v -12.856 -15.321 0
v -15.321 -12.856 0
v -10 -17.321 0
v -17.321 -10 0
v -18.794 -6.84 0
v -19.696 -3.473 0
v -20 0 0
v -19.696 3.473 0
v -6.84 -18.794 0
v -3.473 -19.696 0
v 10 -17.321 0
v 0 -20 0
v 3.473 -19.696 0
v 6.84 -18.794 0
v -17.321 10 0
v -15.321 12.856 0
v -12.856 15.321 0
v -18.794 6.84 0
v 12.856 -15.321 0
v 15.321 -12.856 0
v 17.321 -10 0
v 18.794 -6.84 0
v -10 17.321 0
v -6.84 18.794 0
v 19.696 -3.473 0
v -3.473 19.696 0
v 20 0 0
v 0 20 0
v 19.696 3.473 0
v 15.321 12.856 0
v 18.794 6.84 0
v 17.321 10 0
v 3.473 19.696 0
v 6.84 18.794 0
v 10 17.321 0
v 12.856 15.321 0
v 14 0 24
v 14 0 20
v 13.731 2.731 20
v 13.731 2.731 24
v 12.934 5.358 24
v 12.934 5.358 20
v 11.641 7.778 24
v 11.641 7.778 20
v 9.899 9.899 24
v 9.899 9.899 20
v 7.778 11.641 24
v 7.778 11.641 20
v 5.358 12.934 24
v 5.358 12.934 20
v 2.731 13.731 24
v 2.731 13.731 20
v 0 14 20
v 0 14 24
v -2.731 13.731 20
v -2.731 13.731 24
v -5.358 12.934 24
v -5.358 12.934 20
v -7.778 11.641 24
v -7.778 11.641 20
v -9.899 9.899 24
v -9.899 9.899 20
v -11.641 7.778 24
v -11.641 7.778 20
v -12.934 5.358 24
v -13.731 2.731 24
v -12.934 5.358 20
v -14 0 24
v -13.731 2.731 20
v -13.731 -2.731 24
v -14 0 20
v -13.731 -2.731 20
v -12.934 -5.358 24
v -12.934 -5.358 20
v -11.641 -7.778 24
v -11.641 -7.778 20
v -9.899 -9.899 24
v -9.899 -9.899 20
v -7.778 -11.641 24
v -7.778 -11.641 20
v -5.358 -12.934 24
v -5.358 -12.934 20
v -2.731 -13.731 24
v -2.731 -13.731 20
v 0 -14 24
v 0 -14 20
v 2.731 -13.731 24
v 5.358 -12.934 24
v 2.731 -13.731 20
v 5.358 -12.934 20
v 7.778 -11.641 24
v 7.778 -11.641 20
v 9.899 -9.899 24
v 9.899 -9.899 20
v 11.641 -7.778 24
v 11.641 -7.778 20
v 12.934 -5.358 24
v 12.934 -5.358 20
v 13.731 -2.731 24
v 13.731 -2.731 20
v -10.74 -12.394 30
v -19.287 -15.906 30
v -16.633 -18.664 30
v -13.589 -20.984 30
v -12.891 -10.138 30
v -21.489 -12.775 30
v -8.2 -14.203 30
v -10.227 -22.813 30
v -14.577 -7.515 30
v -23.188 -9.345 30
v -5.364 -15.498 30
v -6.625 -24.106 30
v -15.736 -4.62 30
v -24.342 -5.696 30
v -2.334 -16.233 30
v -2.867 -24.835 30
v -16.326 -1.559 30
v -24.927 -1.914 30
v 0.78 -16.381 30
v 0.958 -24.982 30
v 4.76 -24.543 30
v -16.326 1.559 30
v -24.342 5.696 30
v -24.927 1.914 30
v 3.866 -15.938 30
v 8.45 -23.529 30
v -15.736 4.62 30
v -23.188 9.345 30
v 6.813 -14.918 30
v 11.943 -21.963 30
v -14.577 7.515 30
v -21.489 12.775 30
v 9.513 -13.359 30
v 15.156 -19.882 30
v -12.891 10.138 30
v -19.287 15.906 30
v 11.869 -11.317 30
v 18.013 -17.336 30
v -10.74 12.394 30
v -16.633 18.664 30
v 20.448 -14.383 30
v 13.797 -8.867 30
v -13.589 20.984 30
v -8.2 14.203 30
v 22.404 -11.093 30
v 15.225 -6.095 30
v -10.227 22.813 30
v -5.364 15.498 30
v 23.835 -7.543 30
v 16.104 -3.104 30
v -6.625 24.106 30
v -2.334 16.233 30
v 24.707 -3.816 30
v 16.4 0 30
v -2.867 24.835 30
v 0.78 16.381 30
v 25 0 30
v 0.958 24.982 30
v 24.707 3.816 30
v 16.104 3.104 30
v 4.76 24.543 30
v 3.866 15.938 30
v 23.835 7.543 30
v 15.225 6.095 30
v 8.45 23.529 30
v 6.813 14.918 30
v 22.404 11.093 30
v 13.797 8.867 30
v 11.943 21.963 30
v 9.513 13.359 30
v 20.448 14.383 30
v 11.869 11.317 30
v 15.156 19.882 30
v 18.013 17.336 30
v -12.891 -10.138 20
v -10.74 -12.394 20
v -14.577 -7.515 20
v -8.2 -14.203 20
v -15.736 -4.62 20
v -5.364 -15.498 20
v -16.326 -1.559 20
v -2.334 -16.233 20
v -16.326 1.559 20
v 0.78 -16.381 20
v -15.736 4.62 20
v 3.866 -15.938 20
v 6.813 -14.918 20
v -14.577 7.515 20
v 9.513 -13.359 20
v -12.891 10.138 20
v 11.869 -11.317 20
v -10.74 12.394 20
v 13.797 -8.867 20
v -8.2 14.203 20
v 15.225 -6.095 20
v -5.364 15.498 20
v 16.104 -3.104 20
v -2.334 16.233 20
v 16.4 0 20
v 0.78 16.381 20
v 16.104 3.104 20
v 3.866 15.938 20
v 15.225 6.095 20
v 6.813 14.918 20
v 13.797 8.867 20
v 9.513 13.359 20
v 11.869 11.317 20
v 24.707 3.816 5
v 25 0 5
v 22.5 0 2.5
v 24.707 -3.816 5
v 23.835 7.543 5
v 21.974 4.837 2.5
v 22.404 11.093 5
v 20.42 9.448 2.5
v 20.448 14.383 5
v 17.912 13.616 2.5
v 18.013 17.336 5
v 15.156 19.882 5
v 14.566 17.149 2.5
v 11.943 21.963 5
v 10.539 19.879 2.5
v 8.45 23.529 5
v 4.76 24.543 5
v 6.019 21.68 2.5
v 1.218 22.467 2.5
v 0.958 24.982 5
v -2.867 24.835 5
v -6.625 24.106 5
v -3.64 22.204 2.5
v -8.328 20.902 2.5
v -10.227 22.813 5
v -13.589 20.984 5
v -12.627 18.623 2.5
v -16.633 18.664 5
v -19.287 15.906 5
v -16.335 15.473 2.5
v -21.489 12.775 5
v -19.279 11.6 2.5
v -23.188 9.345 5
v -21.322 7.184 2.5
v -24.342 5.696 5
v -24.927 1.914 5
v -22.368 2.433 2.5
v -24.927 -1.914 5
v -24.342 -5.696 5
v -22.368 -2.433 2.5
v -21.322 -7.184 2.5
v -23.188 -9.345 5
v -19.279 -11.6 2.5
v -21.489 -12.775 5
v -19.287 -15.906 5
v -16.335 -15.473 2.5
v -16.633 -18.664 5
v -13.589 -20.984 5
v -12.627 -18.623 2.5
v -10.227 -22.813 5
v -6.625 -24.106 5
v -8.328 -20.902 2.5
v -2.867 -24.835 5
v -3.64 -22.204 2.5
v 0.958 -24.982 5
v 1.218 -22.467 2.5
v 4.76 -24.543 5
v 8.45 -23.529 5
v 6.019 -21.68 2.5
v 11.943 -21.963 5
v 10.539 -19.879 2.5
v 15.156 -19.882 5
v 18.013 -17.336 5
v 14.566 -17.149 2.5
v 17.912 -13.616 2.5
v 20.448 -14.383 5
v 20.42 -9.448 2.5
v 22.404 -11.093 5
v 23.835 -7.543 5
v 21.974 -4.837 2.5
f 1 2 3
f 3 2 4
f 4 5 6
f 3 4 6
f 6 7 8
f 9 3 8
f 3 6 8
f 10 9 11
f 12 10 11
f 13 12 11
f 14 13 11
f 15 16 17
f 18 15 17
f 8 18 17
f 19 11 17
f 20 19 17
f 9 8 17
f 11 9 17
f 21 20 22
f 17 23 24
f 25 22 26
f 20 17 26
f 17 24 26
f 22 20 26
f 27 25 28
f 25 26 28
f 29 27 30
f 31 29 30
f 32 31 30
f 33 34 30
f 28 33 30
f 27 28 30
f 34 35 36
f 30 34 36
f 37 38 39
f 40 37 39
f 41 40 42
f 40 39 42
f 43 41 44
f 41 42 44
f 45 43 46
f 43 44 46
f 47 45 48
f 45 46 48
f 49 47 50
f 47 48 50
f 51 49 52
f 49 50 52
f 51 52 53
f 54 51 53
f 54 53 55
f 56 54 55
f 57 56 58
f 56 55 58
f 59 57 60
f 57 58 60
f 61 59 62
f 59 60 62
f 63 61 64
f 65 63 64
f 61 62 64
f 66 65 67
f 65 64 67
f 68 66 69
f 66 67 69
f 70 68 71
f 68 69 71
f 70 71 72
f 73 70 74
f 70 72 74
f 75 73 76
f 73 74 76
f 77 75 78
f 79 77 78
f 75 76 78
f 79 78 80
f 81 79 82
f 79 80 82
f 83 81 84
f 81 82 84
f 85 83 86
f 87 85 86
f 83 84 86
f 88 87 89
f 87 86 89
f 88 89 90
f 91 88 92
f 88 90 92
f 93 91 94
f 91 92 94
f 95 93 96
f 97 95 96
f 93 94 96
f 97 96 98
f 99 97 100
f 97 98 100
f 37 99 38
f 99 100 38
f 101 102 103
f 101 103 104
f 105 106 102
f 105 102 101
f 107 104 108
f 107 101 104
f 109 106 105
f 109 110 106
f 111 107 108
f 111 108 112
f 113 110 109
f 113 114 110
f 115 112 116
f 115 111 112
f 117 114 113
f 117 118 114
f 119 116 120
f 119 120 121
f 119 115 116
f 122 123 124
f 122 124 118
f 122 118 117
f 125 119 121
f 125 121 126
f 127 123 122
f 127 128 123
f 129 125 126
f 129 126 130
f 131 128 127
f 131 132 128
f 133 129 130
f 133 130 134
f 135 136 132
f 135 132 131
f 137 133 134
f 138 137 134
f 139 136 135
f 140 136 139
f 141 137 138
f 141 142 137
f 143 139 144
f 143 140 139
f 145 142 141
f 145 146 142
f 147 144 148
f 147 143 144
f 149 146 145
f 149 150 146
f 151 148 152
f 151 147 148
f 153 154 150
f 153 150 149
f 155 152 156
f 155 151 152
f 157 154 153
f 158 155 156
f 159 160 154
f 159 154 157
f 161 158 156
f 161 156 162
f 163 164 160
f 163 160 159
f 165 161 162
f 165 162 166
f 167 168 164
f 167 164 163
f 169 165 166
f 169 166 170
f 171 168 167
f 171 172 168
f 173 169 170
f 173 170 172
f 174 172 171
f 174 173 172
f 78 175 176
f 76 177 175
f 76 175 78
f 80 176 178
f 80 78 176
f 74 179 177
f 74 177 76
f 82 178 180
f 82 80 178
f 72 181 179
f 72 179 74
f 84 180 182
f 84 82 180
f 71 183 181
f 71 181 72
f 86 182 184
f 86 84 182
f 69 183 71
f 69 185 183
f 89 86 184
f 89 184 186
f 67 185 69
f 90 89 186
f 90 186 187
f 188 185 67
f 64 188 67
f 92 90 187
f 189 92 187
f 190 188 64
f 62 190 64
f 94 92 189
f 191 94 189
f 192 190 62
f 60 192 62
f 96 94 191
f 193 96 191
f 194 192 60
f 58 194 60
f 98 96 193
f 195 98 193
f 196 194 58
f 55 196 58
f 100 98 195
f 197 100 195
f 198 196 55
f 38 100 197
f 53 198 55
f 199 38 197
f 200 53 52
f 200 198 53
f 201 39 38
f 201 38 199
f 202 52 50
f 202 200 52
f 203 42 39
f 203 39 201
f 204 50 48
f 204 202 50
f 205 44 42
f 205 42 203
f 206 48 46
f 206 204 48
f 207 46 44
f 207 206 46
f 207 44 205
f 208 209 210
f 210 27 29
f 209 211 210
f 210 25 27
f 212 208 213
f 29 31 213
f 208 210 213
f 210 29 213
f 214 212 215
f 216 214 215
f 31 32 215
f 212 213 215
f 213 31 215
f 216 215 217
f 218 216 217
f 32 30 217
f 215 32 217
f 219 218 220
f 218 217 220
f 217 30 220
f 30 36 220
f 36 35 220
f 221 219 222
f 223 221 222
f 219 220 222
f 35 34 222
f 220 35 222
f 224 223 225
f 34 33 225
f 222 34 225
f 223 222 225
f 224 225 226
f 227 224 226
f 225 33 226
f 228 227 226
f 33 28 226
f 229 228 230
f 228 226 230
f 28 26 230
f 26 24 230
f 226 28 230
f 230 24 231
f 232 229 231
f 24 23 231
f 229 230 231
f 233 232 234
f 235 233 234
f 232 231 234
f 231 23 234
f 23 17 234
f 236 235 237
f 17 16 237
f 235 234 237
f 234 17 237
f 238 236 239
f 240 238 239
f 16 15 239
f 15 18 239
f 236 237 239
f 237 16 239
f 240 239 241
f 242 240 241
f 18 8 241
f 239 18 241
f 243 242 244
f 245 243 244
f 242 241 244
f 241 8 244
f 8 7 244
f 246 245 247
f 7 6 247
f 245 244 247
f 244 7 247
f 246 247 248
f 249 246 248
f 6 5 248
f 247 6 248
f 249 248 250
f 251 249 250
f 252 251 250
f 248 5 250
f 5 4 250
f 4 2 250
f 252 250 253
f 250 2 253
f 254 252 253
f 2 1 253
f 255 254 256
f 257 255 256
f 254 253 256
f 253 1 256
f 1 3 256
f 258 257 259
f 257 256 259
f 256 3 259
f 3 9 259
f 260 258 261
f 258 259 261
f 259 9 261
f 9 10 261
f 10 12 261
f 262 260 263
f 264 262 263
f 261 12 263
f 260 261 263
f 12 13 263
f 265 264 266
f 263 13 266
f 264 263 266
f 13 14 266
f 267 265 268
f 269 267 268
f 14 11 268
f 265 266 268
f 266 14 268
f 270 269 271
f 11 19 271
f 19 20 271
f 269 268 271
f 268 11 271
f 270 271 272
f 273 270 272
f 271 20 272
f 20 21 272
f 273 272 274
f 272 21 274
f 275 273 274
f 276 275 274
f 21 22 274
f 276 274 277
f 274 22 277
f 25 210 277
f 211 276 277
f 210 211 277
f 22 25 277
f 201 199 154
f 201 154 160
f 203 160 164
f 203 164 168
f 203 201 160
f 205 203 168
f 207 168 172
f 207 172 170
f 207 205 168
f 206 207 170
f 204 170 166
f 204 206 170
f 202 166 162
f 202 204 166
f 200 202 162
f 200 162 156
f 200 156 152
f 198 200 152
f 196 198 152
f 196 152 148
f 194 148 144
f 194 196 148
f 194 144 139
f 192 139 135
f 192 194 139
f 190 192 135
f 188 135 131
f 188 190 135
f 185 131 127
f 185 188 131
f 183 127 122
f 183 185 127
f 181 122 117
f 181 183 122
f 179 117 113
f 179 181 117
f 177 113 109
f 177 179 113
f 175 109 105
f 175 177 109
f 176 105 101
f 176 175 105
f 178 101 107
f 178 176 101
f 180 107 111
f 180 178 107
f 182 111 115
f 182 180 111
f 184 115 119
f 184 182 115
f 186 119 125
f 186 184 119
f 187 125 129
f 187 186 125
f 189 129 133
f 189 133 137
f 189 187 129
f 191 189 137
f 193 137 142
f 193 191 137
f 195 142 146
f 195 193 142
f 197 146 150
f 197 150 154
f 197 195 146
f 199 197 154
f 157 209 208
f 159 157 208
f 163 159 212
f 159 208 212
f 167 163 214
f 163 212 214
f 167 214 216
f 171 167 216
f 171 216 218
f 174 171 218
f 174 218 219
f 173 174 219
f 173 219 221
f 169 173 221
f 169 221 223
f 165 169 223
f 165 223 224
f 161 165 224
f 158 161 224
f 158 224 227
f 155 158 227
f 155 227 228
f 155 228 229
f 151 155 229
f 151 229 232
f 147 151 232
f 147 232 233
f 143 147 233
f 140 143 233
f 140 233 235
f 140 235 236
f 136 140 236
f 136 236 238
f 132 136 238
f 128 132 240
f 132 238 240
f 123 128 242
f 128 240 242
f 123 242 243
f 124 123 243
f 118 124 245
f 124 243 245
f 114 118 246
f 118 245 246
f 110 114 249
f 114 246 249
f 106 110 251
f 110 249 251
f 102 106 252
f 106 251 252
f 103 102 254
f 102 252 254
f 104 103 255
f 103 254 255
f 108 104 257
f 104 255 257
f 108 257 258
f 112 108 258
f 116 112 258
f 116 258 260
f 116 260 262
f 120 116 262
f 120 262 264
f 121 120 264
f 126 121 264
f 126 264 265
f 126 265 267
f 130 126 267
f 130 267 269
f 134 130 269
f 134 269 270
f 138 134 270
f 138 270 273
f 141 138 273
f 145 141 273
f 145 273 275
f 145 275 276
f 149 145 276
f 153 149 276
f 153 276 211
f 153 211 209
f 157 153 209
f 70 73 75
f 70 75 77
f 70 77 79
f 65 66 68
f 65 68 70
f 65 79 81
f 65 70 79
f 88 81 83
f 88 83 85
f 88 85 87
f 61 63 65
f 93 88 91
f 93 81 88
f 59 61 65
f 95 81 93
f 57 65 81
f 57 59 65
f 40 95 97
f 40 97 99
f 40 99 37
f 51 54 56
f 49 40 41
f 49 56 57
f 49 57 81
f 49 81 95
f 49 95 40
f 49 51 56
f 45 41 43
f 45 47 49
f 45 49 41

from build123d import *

# Parameters (mm, degrees)
F0_R     = 25
F1_DEPTH = 20
F2_R     = 14
F3_DEPTH = 4
F2_R_2   = 25
F2_R_3   = 16.4
F4_DEPTH = 10
F5_SIZE  = 5


with BuildPart() as f1:
    # F0 (on Top) → F1 (new body)
    with BuildSketch(Plane.XY):
        Circle(F0_R)
    extrude(amount=F1_DEPTH)

    # F2 (on face) → F3 (join)
    with BuildSketch(Plane.XY.offset(20)):
        Circle(F2_R)
    extrude(amount=F3_DEPTH)

    # F2 (on face) → F4 (join)
    with BuildSketch(Plane.XY.offset(20)):
        Circle(F2_R_2)
        Circle(F2_R_3, mode=Mode.SUBTRACT)
    extrude(amount=F4_DEPTH)

    # F5
    f5_edges = [f1.edges().sort_by_distance(p)[0] for p in [
        (-25, 0, 0),
    ]]
    chamfer(f5_edges, length=F5_SIZE)


solid = f1.part
